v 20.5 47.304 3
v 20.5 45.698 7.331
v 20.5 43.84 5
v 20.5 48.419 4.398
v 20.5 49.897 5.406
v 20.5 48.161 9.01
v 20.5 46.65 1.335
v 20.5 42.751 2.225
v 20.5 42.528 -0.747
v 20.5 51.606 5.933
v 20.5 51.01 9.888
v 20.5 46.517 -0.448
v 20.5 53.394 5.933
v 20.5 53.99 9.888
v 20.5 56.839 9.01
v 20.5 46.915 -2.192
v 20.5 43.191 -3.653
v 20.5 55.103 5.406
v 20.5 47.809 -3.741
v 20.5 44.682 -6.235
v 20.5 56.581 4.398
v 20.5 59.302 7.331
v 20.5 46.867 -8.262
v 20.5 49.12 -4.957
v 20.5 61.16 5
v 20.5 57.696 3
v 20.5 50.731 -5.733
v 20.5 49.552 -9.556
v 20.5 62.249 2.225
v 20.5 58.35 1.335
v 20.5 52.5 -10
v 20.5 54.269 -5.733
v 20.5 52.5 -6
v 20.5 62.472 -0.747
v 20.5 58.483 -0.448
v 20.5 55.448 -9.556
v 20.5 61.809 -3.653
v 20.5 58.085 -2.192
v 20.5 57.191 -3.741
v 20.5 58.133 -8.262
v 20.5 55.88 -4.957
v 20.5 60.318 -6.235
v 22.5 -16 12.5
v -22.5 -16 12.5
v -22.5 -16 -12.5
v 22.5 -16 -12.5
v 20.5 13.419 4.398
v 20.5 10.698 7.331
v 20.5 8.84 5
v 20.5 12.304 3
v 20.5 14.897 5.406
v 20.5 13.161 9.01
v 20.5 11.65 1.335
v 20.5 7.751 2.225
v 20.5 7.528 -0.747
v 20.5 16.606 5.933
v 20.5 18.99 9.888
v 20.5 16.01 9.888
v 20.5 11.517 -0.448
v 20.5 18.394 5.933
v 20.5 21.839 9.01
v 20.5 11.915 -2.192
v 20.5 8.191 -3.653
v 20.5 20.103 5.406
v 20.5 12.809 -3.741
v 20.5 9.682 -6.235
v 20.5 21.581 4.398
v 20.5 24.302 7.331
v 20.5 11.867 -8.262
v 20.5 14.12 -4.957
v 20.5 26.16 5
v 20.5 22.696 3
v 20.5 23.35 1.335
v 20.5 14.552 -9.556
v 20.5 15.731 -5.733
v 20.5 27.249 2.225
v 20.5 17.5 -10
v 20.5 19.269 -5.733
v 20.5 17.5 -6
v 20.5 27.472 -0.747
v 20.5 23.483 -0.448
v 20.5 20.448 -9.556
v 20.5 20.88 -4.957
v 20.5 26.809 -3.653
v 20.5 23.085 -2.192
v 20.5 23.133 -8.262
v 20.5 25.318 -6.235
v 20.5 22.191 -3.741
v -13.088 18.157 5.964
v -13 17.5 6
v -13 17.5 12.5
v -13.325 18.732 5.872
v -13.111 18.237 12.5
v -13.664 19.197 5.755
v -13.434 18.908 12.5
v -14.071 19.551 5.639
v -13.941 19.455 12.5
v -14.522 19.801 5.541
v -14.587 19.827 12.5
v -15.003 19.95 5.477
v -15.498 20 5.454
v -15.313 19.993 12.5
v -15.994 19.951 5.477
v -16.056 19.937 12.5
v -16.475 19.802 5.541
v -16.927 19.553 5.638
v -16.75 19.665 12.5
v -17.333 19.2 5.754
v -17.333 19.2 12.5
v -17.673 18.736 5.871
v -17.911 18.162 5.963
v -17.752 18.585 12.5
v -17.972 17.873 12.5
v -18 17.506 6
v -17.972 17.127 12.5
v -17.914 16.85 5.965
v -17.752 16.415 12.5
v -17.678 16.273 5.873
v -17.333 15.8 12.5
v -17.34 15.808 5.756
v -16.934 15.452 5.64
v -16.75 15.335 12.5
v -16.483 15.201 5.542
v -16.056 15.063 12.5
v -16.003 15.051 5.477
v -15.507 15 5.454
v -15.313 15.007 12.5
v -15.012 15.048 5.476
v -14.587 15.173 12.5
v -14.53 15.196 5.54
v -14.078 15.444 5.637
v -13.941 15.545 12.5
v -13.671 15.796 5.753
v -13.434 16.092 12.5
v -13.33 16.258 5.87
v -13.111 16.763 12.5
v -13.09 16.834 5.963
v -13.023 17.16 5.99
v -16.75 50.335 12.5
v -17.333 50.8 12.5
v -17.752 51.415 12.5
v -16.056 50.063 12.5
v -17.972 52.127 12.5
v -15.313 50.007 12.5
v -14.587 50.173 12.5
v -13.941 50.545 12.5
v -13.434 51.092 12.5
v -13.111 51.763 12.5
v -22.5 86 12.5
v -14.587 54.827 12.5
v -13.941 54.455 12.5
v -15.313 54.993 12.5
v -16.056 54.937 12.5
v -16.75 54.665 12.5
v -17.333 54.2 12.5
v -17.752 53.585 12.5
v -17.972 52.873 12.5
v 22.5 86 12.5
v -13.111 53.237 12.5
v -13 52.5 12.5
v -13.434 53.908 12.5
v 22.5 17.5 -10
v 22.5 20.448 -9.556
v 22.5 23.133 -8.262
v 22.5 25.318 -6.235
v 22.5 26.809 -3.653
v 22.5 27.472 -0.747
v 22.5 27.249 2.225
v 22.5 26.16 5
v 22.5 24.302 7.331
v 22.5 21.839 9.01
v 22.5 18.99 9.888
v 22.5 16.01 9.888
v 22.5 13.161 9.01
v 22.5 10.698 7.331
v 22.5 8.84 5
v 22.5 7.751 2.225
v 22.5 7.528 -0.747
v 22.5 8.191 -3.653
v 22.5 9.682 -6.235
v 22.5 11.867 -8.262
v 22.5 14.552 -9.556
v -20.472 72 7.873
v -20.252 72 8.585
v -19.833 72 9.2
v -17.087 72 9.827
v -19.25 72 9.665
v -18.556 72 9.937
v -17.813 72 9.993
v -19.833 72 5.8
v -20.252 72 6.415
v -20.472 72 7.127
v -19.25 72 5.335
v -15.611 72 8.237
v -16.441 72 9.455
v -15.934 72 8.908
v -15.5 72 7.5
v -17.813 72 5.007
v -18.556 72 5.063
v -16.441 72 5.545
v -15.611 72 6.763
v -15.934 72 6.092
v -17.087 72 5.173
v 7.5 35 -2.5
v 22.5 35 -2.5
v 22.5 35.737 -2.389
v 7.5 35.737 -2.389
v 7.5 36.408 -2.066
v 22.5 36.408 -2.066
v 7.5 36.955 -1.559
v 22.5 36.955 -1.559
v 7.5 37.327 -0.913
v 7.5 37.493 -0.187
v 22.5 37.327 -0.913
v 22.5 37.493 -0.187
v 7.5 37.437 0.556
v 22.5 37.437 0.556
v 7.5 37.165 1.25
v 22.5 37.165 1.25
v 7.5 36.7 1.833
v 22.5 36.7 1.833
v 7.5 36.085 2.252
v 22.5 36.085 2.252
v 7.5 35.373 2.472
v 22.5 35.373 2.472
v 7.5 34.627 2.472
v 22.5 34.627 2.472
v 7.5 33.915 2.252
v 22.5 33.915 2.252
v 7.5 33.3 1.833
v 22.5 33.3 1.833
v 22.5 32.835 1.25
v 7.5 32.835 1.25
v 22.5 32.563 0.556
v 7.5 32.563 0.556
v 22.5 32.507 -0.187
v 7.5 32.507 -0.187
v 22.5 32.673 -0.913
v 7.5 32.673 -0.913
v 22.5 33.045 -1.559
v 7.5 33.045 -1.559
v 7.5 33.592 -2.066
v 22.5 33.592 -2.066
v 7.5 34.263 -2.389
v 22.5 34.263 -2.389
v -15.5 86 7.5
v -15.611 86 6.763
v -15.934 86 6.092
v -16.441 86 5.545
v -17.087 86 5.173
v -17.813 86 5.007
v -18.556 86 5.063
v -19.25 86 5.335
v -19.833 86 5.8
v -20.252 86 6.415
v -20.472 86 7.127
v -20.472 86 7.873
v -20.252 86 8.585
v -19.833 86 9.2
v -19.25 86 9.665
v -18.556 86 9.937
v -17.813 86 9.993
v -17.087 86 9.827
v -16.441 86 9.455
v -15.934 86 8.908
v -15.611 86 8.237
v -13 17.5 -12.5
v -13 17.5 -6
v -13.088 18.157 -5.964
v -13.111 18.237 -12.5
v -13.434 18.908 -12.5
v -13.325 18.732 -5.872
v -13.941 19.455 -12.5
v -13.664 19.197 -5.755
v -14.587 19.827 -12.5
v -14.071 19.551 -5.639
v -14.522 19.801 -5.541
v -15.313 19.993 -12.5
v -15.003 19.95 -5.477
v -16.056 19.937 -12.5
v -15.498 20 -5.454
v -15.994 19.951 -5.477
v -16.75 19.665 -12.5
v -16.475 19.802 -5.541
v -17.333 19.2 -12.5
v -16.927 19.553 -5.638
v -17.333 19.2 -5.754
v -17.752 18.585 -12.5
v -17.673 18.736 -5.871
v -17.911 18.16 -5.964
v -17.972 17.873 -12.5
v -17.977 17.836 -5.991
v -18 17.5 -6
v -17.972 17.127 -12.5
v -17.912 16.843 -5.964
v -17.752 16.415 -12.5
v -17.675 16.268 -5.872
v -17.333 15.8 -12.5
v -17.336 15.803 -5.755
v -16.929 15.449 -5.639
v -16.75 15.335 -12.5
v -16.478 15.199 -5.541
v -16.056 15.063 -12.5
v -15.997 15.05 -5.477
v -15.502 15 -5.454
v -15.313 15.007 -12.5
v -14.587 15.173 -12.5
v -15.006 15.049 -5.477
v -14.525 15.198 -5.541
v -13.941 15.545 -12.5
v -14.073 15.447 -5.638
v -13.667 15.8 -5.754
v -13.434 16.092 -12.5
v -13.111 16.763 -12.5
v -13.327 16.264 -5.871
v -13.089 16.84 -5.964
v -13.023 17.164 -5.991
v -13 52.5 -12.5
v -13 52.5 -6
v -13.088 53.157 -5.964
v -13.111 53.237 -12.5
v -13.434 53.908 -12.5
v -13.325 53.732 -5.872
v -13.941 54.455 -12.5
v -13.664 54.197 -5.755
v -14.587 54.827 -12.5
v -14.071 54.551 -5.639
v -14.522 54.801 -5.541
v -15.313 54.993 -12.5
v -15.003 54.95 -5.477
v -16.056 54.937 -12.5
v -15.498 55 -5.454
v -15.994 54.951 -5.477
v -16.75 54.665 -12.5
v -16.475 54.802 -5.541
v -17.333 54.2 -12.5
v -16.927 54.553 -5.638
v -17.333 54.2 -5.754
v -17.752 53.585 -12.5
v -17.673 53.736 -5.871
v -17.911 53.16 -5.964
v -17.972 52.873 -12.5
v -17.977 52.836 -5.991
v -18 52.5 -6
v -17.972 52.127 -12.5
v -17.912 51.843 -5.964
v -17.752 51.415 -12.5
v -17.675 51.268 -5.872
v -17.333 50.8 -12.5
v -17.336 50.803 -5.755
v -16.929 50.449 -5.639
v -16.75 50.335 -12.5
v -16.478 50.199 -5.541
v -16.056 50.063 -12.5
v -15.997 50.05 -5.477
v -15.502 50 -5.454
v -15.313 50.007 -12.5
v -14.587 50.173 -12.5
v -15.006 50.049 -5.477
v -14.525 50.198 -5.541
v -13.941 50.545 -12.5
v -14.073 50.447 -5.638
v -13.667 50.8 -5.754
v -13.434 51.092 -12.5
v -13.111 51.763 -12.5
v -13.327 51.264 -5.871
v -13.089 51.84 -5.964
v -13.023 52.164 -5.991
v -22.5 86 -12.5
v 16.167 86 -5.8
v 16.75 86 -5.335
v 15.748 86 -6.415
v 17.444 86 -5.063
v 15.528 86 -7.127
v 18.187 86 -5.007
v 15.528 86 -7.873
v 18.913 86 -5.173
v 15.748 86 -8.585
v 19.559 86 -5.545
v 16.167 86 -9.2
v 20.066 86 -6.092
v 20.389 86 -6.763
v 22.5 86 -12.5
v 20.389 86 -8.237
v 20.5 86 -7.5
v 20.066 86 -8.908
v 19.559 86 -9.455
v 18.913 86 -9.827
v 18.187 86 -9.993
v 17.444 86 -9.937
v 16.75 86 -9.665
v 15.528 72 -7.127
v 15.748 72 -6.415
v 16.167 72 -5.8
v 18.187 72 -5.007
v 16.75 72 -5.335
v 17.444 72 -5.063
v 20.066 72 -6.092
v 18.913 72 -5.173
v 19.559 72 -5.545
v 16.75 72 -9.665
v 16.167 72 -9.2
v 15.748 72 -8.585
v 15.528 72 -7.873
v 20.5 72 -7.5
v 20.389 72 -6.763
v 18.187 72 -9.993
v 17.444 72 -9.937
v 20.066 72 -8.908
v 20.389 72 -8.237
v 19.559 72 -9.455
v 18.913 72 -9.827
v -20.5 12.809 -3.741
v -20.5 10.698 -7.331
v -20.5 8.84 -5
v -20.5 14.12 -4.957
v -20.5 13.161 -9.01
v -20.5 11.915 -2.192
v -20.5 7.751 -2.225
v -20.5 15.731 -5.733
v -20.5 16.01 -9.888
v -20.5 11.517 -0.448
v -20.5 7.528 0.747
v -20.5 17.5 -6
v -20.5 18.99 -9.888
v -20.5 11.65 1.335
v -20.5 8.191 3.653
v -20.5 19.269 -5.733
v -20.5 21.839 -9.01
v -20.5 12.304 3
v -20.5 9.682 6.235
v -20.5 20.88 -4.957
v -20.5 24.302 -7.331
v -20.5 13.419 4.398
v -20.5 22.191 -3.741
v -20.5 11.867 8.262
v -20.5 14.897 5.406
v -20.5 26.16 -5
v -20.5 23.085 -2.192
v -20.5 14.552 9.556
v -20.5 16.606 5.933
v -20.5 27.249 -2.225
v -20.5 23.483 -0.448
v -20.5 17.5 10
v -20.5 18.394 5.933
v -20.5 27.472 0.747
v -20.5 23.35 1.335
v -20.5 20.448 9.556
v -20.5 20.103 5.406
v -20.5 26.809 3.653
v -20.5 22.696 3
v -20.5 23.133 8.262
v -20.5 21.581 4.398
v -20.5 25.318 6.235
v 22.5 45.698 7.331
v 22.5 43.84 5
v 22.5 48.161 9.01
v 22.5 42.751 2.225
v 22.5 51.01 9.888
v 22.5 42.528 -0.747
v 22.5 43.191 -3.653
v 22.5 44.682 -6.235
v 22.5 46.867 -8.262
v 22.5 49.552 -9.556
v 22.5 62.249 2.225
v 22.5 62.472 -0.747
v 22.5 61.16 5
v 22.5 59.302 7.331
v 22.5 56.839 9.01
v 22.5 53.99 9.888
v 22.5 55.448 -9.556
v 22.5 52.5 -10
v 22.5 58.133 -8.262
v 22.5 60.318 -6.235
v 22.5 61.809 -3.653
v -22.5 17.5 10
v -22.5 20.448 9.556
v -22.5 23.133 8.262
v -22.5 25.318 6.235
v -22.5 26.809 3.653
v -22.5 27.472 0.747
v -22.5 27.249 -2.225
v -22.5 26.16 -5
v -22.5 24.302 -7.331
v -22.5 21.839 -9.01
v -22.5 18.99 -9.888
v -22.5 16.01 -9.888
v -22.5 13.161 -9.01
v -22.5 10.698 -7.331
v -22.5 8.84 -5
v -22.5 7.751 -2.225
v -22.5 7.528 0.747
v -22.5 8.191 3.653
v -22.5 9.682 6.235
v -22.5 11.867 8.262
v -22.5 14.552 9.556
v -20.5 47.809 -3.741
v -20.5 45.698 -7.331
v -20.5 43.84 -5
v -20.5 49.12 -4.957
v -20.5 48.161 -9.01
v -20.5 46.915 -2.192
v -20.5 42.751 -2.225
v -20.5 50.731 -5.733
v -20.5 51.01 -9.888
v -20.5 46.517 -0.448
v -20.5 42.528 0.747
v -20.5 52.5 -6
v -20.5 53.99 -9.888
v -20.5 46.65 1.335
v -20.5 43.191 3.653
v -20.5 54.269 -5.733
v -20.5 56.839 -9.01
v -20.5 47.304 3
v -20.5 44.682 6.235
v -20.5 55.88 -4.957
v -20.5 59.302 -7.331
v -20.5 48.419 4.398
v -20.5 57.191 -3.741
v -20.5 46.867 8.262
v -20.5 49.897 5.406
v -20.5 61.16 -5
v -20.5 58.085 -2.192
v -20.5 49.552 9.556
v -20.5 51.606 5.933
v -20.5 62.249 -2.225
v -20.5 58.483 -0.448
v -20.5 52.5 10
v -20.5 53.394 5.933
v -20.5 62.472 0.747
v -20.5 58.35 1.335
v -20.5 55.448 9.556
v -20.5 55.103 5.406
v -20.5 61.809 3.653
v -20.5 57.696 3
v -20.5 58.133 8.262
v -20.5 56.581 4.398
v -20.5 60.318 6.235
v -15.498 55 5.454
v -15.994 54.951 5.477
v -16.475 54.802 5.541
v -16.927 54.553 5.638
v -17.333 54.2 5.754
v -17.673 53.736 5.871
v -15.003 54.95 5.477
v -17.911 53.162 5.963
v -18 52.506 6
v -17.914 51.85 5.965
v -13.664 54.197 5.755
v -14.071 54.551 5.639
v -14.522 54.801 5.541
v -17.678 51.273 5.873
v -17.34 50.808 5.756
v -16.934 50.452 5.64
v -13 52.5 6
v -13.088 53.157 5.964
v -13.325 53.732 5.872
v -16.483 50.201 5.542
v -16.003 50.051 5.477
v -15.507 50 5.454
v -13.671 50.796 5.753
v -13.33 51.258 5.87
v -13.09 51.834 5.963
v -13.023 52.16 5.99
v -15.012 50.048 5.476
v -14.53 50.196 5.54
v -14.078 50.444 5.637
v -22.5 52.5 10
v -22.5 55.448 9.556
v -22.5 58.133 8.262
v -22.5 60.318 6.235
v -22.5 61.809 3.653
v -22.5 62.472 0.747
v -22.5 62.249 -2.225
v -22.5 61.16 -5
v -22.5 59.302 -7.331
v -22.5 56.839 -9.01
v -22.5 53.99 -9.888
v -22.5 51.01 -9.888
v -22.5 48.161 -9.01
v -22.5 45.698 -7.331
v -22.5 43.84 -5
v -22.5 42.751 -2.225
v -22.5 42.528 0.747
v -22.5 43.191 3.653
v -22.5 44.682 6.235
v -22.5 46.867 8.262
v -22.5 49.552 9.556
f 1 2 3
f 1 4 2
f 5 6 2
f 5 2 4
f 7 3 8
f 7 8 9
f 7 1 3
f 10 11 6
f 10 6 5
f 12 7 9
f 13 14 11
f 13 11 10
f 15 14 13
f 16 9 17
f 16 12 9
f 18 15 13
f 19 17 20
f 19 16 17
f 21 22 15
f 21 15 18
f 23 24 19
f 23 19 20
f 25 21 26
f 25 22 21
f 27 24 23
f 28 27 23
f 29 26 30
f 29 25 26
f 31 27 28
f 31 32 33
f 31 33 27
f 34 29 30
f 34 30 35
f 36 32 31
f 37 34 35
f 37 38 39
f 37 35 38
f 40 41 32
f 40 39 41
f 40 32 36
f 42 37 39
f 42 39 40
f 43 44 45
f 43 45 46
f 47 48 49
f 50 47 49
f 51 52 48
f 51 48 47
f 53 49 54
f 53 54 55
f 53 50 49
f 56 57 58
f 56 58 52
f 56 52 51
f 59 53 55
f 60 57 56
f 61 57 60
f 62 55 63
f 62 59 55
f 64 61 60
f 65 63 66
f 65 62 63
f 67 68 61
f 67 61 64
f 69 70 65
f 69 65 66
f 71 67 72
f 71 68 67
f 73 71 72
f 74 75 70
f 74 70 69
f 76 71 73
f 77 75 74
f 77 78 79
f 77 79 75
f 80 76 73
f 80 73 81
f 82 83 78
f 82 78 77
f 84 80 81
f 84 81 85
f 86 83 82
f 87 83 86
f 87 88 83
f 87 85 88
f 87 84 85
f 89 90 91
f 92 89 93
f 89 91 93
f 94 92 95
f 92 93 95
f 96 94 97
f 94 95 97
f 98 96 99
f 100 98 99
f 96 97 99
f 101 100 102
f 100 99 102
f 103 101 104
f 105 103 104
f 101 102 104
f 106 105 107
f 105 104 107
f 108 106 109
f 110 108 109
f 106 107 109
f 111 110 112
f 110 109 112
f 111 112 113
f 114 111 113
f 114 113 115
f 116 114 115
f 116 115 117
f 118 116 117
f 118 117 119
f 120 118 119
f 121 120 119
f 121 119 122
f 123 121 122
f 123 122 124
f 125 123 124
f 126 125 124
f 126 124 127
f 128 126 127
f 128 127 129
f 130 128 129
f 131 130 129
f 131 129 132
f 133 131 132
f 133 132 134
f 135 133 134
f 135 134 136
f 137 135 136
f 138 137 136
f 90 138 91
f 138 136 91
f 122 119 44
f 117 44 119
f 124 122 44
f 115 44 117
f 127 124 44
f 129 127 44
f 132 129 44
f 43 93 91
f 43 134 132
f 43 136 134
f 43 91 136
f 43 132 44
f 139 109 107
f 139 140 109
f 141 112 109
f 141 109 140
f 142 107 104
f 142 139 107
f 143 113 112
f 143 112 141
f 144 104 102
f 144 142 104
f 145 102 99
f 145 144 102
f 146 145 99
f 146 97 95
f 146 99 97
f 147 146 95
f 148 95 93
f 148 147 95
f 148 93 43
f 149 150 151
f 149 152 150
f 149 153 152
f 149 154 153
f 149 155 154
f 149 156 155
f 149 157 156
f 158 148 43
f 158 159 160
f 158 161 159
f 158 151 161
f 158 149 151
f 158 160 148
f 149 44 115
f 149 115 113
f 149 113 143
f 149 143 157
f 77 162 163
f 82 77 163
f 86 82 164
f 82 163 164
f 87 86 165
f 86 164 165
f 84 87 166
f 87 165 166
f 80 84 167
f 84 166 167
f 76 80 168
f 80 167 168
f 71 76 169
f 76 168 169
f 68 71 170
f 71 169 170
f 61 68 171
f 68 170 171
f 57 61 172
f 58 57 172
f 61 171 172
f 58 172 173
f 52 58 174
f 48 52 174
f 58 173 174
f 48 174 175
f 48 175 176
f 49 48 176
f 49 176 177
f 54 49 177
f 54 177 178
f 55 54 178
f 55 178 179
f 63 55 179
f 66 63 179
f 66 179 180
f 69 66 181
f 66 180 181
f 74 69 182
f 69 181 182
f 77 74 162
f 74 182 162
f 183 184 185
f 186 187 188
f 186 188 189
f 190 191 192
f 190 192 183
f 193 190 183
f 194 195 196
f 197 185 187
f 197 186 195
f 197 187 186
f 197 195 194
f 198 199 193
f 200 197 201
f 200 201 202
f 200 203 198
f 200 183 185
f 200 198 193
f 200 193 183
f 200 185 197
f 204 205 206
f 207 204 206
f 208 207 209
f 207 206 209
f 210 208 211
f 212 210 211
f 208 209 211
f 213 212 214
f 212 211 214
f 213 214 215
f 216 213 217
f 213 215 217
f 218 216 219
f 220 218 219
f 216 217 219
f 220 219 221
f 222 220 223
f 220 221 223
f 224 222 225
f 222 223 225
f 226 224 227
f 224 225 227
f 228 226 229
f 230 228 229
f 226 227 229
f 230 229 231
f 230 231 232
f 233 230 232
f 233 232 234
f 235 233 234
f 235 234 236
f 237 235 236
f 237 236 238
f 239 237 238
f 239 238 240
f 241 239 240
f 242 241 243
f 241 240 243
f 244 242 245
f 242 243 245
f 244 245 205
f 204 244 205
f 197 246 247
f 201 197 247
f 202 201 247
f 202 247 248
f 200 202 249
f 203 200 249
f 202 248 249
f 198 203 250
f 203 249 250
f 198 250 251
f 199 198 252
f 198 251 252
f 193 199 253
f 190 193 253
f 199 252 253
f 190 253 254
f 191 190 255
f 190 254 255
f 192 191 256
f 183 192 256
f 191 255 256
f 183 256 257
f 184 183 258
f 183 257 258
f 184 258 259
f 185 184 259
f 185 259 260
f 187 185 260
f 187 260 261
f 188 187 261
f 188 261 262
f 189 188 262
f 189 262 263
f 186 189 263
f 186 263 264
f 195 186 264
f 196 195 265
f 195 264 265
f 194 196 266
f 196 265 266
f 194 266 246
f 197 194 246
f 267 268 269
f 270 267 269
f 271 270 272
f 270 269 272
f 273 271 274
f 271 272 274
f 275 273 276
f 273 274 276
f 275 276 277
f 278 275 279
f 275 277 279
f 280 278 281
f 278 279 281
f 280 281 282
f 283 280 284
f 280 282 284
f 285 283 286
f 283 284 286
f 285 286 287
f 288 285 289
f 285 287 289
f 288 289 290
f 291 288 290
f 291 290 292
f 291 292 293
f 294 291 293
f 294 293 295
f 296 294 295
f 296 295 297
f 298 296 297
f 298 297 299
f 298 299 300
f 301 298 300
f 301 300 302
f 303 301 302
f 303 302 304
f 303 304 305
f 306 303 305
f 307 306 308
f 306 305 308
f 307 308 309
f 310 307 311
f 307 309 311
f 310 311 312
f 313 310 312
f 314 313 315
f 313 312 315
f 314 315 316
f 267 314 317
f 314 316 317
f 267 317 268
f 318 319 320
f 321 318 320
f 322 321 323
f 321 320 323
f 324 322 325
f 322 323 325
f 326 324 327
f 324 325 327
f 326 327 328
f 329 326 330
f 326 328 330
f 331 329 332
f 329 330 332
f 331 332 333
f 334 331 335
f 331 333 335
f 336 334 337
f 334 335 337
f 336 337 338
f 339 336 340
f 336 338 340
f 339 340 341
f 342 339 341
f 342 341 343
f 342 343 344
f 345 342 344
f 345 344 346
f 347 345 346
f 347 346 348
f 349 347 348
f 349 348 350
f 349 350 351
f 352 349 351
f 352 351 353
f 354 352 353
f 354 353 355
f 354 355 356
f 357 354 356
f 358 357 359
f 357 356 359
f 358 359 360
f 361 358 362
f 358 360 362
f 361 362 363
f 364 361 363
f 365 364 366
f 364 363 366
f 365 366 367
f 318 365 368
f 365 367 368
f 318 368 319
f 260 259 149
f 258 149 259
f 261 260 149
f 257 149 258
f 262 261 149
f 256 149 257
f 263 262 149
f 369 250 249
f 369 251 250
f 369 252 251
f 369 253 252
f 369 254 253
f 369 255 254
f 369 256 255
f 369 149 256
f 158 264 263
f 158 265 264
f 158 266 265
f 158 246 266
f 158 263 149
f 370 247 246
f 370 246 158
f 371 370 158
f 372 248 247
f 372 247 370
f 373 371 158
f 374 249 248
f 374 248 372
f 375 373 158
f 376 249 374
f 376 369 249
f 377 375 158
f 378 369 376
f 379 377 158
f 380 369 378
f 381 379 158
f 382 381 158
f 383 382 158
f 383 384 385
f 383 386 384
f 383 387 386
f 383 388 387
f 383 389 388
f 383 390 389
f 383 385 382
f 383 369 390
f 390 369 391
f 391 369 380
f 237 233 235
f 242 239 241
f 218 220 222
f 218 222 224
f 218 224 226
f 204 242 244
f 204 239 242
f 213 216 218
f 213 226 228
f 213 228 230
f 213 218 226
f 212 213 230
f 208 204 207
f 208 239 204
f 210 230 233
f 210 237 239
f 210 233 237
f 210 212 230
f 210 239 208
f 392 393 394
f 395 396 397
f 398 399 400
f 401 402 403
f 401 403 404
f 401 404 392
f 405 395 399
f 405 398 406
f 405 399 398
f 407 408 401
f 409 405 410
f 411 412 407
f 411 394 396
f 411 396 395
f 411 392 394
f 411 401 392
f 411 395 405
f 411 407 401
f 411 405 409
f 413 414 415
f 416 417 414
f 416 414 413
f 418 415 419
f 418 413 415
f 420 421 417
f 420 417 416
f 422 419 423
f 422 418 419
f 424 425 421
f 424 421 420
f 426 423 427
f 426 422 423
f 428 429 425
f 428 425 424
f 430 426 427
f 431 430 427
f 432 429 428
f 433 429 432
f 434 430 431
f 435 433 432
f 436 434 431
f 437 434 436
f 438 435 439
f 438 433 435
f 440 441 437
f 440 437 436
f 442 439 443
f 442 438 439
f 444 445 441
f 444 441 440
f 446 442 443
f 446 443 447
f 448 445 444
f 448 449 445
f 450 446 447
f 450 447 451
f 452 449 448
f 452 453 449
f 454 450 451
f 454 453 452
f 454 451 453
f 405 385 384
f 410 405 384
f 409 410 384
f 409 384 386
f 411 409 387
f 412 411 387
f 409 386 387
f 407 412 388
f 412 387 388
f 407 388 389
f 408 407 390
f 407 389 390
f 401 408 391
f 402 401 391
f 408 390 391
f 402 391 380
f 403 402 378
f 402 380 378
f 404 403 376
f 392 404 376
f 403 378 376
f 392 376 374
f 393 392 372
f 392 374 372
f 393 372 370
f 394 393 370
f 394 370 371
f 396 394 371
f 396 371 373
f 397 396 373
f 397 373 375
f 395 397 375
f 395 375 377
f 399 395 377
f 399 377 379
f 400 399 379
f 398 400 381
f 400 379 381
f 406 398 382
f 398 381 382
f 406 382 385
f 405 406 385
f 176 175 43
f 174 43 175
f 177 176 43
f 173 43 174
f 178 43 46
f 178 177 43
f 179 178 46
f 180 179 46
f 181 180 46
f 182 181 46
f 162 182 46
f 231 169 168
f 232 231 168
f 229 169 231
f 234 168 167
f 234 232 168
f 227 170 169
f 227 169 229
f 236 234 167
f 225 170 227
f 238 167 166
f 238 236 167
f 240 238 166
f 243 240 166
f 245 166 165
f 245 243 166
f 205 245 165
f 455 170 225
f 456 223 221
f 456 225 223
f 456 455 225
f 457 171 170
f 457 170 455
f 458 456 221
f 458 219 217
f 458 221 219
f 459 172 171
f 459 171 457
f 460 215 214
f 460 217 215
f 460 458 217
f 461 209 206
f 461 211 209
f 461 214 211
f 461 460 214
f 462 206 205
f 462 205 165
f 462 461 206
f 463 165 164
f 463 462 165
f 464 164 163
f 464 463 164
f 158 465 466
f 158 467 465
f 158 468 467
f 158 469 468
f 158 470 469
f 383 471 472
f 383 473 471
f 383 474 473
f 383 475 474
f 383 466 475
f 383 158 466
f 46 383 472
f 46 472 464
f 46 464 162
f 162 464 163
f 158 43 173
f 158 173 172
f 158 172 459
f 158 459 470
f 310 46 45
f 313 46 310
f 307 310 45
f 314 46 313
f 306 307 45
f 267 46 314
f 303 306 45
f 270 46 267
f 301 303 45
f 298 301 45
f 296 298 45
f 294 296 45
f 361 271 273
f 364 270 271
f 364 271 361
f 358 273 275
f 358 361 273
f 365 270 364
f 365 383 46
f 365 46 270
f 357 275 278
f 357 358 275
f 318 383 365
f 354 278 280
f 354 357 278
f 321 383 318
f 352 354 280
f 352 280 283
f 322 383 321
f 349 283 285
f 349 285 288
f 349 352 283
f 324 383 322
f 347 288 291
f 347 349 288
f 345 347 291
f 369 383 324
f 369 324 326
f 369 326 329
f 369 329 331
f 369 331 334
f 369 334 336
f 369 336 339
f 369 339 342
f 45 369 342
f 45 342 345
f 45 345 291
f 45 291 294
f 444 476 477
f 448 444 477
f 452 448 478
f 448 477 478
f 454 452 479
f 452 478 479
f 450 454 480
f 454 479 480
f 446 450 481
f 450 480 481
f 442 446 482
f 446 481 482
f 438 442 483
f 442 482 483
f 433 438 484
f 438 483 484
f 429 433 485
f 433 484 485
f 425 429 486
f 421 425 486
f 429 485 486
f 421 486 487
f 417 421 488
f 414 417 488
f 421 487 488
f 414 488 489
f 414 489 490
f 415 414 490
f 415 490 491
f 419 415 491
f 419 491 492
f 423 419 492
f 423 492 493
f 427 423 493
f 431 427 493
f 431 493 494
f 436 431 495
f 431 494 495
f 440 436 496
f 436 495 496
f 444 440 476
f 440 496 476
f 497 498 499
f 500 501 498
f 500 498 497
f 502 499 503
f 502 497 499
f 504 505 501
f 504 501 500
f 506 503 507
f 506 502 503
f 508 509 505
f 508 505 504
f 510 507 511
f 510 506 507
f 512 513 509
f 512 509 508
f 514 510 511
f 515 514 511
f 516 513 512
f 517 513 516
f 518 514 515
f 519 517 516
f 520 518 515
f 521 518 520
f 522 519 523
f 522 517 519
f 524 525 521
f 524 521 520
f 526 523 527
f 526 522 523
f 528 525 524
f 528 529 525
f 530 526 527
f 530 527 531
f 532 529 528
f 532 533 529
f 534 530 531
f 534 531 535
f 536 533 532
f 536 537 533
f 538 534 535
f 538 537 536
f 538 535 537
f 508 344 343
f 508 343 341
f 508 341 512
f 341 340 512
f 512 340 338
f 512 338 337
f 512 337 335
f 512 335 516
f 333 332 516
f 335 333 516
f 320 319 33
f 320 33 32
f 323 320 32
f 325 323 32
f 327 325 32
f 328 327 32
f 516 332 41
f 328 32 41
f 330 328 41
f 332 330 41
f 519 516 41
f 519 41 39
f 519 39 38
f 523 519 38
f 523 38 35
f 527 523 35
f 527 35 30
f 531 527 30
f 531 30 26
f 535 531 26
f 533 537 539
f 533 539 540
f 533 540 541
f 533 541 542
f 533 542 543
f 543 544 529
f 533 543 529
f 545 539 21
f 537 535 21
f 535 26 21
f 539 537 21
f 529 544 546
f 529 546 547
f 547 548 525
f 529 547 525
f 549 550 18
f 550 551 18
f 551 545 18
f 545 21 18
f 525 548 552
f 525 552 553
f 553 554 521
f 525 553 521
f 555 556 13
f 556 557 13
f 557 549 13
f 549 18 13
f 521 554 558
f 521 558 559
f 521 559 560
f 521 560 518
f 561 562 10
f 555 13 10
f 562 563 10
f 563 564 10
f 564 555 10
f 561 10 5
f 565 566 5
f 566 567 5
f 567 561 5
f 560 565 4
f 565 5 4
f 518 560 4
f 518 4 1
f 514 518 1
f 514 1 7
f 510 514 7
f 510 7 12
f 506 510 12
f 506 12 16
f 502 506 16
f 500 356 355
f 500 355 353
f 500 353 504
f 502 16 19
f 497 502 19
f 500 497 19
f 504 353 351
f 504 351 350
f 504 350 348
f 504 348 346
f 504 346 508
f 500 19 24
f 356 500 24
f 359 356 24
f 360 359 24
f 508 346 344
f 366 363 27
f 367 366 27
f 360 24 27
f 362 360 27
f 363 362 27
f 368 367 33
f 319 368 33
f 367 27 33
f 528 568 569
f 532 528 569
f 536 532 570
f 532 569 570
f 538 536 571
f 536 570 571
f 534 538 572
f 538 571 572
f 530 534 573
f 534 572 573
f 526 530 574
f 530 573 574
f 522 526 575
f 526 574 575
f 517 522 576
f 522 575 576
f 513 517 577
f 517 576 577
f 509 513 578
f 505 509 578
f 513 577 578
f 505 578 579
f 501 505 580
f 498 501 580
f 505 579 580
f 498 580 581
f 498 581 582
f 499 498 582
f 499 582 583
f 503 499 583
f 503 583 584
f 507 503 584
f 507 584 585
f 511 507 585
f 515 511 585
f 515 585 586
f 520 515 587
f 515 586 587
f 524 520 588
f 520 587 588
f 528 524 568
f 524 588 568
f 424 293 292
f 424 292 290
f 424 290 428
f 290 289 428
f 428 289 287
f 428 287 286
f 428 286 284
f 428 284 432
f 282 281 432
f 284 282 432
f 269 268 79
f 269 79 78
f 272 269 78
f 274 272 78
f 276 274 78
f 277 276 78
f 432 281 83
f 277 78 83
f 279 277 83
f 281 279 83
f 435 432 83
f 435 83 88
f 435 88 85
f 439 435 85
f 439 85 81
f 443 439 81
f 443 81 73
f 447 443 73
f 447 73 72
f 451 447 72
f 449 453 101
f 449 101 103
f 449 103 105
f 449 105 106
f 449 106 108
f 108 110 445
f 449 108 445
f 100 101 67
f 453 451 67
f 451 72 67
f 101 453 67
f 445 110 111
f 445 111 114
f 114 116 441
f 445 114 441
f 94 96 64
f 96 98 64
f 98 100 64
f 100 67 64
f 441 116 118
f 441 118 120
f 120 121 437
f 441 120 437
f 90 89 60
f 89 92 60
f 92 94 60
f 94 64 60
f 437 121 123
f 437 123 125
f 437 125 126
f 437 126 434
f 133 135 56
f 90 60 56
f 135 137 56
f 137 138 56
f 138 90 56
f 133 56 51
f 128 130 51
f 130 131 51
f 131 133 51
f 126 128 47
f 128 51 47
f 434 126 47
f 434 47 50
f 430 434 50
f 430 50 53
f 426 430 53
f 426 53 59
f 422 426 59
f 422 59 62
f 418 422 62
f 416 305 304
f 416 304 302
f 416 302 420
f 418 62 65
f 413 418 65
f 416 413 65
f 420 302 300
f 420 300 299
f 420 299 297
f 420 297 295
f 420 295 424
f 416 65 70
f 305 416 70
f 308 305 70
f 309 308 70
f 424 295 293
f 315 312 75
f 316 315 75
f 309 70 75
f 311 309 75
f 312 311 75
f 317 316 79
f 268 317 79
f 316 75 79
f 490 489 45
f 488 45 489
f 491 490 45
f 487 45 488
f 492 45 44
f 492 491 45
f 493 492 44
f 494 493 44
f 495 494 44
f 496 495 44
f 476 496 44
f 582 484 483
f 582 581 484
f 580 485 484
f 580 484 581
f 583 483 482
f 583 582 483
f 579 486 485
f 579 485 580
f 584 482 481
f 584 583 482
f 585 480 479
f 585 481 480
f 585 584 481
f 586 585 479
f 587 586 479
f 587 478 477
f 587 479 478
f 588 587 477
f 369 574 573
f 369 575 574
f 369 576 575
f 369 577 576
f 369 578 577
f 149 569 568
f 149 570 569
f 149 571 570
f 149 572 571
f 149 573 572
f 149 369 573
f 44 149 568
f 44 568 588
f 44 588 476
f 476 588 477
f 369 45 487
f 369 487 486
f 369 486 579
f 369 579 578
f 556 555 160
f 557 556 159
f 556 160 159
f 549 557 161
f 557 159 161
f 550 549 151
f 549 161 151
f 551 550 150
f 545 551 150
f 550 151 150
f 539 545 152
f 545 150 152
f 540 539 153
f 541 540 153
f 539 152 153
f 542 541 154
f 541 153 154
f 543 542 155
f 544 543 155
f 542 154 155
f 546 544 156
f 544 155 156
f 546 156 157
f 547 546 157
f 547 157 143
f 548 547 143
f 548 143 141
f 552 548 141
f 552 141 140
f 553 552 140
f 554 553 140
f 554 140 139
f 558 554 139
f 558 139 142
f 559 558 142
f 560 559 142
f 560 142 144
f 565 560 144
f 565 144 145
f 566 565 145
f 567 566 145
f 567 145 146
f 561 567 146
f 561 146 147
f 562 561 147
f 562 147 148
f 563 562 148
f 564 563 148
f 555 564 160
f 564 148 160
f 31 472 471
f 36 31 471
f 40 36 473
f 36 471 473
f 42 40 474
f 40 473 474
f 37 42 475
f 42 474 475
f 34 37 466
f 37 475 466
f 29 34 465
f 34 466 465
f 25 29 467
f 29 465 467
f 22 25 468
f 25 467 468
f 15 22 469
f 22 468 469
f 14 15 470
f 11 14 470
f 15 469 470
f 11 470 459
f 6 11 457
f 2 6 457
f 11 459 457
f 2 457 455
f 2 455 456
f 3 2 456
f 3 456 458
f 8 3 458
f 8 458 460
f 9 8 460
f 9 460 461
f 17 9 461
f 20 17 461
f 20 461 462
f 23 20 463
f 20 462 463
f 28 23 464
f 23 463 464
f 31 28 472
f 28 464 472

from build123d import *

# Parameters (mm, degrees)
SKETCH1_W           = 45
SKETCH1_H           = 25
BOSS_EXTRUDE1_DEPTH = 70
SKETCH2_R           = 6
CUT_EXTRUDE1_DEPTH  = 70
SKETCH3_R           = 10
CUT_EXTRUDE2_DEPTH  = 2
SKETCH4_R           = 10
CUT_EXTRUDE3_DEPTH  = 2
SKETCH5_R           = 2.5
CUT_EXTRUDE4_DEPTH  = 15
SKETCH6_R           = 2.5
CUT_EXTRUDE5_DEPTH  = 15
SKETCH7_R           = 2.5
CUT_EXTRUDE6_DEPTH  = 36
SKETCH8_R           = 2.5
CUT_EXTRUDE7_DEPTH  = 38
SKETCH9_W           = 45
SKETCH9_H           = 25
BOSS_EXTRUDE2_DEPTH = 16
SKETCH10_W          = 45
SKETCH10_H          = 25
BOSS_EXTRUDE3_DEPTH = 16
SKETCH11_R          = 2.5
BOSS_EXTRUDE4_DEPTH = 25
SKETCH12_R          = 2.5
BOSS_EXTRUDE5_DEPTH = 27
SKETCH13_R          = 2.5
CUT_EXTRUDE8_DEPTH  = 14


with BuildPart() as part:
    # Sketch1 → Boss-Extrude1 (new body)
    with BuildSketch(Plane(origin=(0, 0, 0), x_dir=(1, 0, 0), z_dir=(0, 1, 0))):
        Rectangle(SKETCH1_W, SKETCH1_H)
    extrude(amount=BOSS_EXTRUDE1_DEPTH)

    # Sketch2 → Cut-Extrude1 (cut)
    with BuildSketch(Plane(origin=(22.5, 0, 0), x_dir=(0, 0, -1), z_dir=(1, 0, 0))):
        with Locations((0, 52.5)):
            Circle(SKETCH2_R)
        with Locations((0, 17.5)):
            Circle(SKETCH2_R)
    extrude(amount=-CUT_EXTRUDE1_DEPTH, mode=Mode.SUBTRACT)

    # Sketch3 → Cut-Extrude2 (cut)
    with BuildSketch(Plane(origin=(22.5, 0, 0), x_dir=(0, 0, -1), z_dir=(1, 0, 0))):
        with Locations((0, 17.5)):
            Circle(SKETCH3_R)
        with Locations((0, 52.5)):
            Circle(SKETCH3_R)
    extrude(amount=-CUT_EXTRUDE2_DEPTH, mode=Mode.SUBTRACT)

    # Sketch4 → Cut-Extrude3 (cut)
    with BuildSketch(Plane.ZY.offset(22.5)):
        with Locations((0, 52.5)):
            Circle(SKETCH4_R)
        with Locations((0, 17.5)):
            Circle(SKETCH4_R)
    extrude(amount=-CUT_EXTRUDE3_DEPTH, mode=Mode.SUBTRACT)

    # Sketch5 → Cut-Extrude4 (cut)
    with BuildSketch(Plane(origin=(22.5, 0, 0), x_dir=(0, 0, -1), z_dir=(1, 0, 0))):
        with Locations((7.5, 6)):
            Circle(SKETCH5_R)
        with Locations((-7.5, 6)):
            Circle(SKETCH5_R)
        with Locations((7.5, 64)):
            Circle(SKETCH5_R)
        with Locations((-7.5, 64)):
            Circle(SKETCH5_R)
    extrude(amount=-CUT_EXTRUDE4_DEPTH, mode=Mode.SUBTRACT)

    # Sketch6 → Cut-Extrude5 (cut)
    with BuildSketch(Plane(origin=(22.5, 0, 0), x_dir=(0, 0, -1), z_dir=(1, 0, 0))):
        with Locations((0, 35)):
            Circle(SKETCH6_R)
    extrude(amount=-CUT_EXTRUDE5_DEPTH, mode=Mode.SUBTRACT)

    # Sketch7 → Cut-Extrude6 (cut)
    with BuildSketch(Plane.XY.offset(12.5)):
        with Locations((-15.5, 52.5)):
            Circle(SKETCH7_R)
        with Locations((-15.5, 17.5)):
            Circle(SKETCH7_R)
    extrude(amount=-CUT_EXTRUDE6_DEPTH, mode=Mode.SUBTRACT)

    # Sketch8 → Cut-Extrude7 (cut)
    with BuildSketch(Plane.XY.offset(12.5)):
        with Locations((-15.5, 64)):
            Circle(SKETCH8_R)
        with Locations((-15.5, 6)):
            Circle(SKETCH8_R)
    extrude(amount=-CUT_EXTRUDE7_DEPTH, mode=Mode.SUBTRACT)

    # Sketch9 → Boss-Extrude2 (add)
    with BuildSketch(Plane(origin=(0, 70, 0), x_dir=(1, 0, 0), z_dir=(0, 1, 0))):
        Rectangle(SKETCH9_W, SKETCH9_H)
    extrude(amount=BOSS_EXTRUDE2_DEPTH)

    # Sketch10 → Boss-Extrude3 (add)
    with BuildSketch(Plane.XZ):
        Rectangle(SKETCH10_W, SKETCH10_H)
    extrude(amount=BOSS_EXTRUDE3_DEPTH)

    # Sketch11 → Boss-Extrude4 (add)
    with BuildSketch(Plane(origin=(0, 0, -12.5), x_dir=(-1, 0, 0), z_dir=(0, 0, -1))):
        with Locations((15.5, 64)):
            Circle(SKETCH11_R)
        with Locations((15.5, 6)):
            Circle(SKETCH11_R)
    extrude(amount=-BOSS_EXTRUDE4_DEPTH)

    # Sketch12 → Boss-Extrude5 (add)
    with BuildSketch(Plane(origin=(22.5, 0, 0), x_dir=(0, 0, -1), z_dir=(1, 0, 0))):
        with Locations((-7.5, 64)):
            Circle(SKETCH12_R)
        with Locations((7.5, 64)):
            Circle(SKETCH12_R)
        with Locations((-7.5, 6)):
            Circle(SKETCH12_R)
        with Locations((7.5, 6)):
            Circle(SKETCH12_R)
    extrude(amount=-BOSS_EXTRUDE5_DEPTH)

    # Sketch13 → Cut-Extrude8 (cut)
    with BuildSketch(Plane(origin=(0, 86, 0), x_dir=(1, 0, 0), z_dir=(0, 1, 0))):
        with Locations((18, 7.5)):
            Circle(SKETCH13_R)
        with Locations((-18, -7.5)):
            Circle(SKETCH13_R)
    extrude(amount=-CUT_EXTRUDE8_DEPTH, mode=Mode.SUBTRACT)


solid = part.part
